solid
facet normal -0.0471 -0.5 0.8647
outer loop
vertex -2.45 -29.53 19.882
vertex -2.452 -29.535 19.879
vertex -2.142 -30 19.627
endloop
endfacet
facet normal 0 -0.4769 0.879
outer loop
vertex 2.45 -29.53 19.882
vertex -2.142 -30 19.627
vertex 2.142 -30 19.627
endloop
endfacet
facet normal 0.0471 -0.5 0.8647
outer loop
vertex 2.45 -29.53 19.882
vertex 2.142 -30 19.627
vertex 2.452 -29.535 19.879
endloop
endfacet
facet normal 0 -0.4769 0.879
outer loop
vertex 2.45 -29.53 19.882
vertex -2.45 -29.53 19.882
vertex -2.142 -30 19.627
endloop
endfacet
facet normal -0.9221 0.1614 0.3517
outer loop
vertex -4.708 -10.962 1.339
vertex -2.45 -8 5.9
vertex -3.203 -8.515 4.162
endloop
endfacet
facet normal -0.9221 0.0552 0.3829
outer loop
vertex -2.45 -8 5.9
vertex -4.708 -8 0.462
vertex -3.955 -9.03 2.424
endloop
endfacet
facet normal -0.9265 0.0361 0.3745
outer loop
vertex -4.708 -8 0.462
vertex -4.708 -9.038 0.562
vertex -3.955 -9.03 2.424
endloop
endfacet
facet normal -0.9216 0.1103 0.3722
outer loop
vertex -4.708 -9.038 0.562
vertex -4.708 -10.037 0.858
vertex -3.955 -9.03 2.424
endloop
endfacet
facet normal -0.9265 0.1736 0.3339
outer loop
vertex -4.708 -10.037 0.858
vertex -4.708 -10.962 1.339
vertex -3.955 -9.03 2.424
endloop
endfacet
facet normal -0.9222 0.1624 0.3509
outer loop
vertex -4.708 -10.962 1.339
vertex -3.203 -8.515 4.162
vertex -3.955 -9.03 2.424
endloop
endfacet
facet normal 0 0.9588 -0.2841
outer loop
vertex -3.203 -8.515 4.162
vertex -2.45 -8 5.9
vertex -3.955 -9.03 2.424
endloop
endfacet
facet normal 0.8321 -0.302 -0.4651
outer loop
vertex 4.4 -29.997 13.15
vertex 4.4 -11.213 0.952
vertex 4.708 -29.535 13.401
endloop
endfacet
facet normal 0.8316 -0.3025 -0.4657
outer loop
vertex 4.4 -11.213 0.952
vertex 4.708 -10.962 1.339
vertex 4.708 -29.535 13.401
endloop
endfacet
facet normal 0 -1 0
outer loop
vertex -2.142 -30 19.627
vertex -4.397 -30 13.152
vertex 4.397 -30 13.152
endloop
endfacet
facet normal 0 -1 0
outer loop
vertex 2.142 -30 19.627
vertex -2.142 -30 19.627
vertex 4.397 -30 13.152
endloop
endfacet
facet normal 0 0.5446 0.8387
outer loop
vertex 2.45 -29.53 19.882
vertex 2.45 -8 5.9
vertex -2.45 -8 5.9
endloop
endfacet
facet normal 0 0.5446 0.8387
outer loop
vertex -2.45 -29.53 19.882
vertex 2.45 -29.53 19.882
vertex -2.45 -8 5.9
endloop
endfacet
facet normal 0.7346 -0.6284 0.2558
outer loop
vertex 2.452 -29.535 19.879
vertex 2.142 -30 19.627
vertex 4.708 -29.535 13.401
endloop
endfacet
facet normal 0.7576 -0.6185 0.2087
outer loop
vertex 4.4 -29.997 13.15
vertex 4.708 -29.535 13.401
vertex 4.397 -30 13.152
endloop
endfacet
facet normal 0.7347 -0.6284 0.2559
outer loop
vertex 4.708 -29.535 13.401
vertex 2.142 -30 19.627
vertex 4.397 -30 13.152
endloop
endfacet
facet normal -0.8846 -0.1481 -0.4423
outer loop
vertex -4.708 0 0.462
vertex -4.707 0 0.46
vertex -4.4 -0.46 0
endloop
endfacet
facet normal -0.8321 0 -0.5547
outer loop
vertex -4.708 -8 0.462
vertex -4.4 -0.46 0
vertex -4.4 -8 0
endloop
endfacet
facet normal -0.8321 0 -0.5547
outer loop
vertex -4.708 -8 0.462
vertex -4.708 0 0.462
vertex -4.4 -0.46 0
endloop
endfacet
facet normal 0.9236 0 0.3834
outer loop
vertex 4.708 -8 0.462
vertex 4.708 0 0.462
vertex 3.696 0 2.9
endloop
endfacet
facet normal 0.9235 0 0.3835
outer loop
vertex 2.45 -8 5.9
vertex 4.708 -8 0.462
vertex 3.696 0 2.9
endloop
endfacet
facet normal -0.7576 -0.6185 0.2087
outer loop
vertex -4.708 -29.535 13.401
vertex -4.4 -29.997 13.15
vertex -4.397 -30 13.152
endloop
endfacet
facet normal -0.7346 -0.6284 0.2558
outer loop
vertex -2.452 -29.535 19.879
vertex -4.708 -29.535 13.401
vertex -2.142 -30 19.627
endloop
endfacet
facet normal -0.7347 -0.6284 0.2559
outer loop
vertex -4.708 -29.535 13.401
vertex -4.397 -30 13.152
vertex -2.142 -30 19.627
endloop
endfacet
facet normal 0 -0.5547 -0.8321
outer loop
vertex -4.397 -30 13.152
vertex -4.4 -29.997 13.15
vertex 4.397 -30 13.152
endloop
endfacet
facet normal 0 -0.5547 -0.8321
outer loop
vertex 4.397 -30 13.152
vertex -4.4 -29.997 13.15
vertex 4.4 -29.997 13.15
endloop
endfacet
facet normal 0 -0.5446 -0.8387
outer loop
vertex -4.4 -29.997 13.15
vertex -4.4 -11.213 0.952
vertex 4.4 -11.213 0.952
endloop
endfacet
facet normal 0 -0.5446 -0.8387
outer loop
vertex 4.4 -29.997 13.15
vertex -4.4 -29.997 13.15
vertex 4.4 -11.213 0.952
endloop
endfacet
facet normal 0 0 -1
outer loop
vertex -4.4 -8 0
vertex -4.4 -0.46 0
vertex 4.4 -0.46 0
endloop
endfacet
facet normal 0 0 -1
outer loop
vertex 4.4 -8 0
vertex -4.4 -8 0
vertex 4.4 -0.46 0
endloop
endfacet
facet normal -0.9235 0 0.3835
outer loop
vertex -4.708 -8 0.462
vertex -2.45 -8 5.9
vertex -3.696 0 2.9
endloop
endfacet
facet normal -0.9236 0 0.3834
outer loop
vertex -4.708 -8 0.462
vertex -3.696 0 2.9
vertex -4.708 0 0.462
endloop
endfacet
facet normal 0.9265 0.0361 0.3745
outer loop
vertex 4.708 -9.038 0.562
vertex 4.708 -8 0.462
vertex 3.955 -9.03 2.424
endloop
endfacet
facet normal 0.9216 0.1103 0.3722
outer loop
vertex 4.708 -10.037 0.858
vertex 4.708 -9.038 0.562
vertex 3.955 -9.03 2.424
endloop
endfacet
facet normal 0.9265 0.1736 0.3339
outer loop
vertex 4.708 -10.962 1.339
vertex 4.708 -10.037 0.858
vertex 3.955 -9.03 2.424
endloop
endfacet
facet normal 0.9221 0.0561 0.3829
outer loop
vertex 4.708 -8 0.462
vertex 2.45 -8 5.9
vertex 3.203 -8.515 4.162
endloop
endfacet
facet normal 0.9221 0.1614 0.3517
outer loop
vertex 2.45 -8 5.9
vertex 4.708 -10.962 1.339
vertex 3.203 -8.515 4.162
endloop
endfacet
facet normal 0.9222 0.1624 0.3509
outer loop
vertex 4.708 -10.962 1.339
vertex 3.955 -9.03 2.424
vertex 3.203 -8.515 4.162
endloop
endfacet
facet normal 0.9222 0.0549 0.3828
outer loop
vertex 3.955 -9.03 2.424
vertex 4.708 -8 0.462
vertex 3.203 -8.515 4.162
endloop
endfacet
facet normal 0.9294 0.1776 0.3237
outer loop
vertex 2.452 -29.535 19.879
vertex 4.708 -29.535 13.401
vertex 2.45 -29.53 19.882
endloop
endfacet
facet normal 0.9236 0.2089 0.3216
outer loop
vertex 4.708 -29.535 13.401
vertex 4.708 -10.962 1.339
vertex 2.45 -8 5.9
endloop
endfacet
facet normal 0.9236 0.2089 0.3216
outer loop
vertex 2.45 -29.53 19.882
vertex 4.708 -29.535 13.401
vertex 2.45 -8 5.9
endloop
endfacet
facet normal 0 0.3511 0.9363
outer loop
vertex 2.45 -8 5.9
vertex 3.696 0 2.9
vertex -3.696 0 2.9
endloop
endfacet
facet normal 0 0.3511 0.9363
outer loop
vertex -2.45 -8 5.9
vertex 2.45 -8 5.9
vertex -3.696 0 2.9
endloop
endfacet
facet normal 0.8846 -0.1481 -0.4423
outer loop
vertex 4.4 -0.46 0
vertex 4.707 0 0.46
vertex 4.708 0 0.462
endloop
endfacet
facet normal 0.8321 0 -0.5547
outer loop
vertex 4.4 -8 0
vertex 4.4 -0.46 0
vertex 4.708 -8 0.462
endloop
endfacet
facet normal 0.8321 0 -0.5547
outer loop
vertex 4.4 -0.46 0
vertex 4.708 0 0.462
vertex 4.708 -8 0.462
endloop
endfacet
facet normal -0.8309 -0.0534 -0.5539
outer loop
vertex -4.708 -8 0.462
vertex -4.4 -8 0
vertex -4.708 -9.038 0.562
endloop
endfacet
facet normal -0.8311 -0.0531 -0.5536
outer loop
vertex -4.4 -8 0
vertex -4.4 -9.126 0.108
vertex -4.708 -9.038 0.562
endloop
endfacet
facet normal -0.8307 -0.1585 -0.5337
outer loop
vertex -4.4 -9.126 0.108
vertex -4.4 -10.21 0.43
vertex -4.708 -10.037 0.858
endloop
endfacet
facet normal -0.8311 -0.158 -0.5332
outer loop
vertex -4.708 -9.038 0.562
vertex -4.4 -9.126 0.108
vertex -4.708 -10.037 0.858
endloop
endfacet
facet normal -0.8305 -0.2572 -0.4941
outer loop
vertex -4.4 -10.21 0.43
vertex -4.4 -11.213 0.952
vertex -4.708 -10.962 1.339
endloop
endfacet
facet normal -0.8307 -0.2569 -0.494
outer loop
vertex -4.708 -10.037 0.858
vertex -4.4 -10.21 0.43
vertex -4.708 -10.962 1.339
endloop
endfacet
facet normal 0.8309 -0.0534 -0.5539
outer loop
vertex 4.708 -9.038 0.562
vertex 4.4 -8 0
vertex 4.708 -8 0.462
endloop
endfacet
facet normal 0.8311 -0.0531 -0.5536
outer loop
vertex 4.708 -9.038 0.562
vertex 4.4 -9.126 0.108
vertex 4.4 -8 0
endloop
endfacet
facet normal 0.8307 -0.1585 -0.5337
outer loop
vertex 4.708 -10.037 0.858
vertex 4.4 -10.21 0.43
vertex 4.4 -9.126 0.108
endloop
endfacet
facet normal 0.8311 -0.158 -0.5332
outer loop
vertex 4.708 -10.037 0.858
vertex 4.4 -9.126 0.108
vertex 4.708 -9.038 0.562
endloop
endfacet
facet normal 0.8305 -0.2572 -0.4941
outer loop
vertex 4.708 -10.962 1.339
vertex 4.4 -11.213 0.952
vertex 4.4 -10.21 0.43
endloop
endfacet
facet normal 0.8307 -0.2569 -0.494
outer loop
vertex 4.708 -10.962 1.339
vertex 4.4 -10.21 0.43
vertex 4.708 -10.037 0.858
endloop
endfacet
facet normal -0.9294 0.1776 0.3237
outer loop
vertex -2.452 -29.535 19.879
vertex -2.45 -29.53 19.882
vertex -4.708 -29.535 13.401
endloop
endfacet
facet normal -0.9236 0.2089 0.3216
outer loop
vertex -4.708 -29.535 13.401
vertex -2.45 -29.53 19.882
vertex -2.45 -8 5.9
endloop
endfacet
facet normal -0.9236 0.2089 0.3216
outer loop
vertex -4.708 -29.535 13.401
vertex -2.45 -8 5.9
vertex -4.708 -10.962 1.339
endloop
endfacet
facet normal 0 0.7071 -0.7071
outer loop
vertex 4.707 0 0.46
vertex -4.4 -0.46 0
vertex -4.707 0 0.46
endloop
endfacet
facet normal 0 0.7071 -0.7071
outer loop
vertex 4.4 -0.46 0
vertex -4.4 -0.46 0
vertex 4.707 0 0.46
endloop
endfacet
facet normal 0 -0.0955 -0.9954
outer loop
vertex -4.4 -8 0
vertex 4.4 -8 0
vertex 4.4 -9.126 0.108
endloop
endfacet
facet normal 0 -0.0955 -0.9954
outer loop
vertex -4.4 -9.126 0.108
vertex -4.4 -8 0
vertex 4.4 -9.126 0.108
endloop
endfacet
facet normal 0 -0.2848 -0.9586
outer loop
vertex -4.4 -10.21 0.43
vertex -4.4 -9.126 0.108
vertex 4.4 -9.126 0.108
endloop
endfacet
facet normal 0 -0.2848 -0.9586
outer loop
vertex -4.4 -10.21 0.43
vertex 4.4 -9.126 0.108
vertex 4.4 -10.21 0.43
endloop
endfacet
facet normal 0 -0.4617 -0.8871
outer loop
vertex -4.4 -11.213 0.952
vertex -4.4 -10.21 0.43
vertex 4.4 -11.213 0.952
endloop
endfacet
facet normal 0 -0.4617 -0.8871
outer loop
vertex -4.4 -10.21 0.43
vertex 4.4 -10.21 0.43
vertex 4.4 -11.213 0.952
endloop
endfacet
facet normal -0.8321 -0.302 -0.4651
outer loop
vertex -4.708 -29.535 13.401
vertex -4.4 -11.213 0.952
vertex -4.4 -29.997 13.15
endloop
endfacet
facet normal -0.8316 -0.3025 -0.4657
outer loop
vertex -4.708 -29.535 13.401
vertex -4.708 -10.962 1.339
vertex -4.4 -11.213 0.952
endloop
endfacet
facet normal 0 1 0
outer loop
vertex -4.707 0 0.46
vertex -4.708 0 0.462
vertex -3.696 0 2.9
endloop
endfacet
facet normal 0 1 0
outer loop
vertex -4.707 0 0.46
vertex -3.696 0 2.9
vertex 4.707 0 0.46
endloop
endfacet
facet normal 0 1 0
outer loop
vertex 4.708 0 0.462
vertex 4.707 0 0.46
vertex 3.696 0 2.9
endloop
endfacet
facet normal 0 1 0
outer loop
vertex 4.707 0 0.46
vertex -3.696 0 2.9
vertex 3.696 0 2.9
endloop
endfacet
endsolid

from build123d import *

# Parameters (mm, degrees)
F1_DEPTH  = 8
F3_ANGLE  = 33
F6_DEPTH  = 26.5
F7_W      = 18.4942251071
F7_H      = 9.6429027617
F8_DEPTH  = 25
F9_SIZE   = 0.5
F10_SIZE2 = 2.99999
F10_SIZE  = 7.99999
F11_SIZE  = 0.46
F12_SIZE  = 0.475
F13_SIZE  = 0.56


# Not quite as in the source:
# - a fillet or chamfer is up to 0.001 mm smaller than in the source, because OpenCascade refuses the exact size


with BuildPart() as f1:
    # F0 (on Front) → F1 (new body)
    with BuildSketch(Plane.XZ):
        Polygon((-2.45, 5.9), (-4.9, 0), (4.9, 0), (2.45, 5.9), align=None)
    extrude(amount=F1_DEPTH)

    # F2 (on face) → F3 (revolve)
    with BuildSketch(Plane.XZ.offset(8)):
        Polygon((4.9, 0), (2.45, 5.9), (-2.45, 5.9), (-4.9, 0), align=None)
    revolve(axis=Axis((0, -8, 5.9), (-1, 0, 0)), revolution_arc=F3_ANGLE)

    # F4 (on face) → F6 (join)
    with BuildSketch(Plane(origin=(0, -8.3219056723, 5.4043087335), x_dir=(1, 0, 0), z_dir=(0, -0.8386705679, 0.544639035))):
        Polygon((-4.9, -5.3089559292), (4.9, -5.3089559292), (2.45, 0.5910440708), (-2.45, 0.5910440708), align=None)
    extrude(amount=F6_DEPTH)

    # F7 (on Top) → F8 (cut)
    with BuildSketch(Plane.XY):
        with Locations((0.8348836564, -34.8214513808)):
            Rectangle(F7_W, F7_H)
    extrude(amount=F8_DEPTH, mode=Mode.SUBTRACT)

    # F9
    f9_edges = [f1.edges().sort_by_distance(p)[0] for p in [
        (4.9, -4, 0),
        (-4.9, -4, 0),
    ]]
    chamfer(f9_edges, length=F9_SIZE)

    # F10 (size 8 and 3 in the source; OpenCascade refuses exactly that, so slightly less here)
    f10_edges = [f1.edges().sort_by_distance(p)[0] for p in [
        (0, 0, 5.9),
    ]]
    f10_side = f1.faces().sort_by_distance((0, -4, 5.9))[0]
    chamfer(f10_edges, length=F10_SIZE, length2=F10_SIZE2, reference=f10_side)

    # F11
    f11_edges = [f1.edges().sort_by_distance(p)[0] for p in [
        (0, 0, 0),
    ]]
    chamfer(f11_edges, length=F11_SIZE)

    # F12
    f12_edges = [f1.edges().sort_by_distance(p)[0] for p in [
        (-3.579124, -30, 16.944794),
        (3.579124, -30, 16.944794),
    ]]
    chamfer(f12_edges, length=F12_SIZE)

    # F13
    f13_edges = [f1.edges().sort_by_distance(p)[0] for p in [
        (0, -30, 20.186967),
    ]]
    chamfer(f13_edges, length=F13_SIZE)


solid = f1.part
